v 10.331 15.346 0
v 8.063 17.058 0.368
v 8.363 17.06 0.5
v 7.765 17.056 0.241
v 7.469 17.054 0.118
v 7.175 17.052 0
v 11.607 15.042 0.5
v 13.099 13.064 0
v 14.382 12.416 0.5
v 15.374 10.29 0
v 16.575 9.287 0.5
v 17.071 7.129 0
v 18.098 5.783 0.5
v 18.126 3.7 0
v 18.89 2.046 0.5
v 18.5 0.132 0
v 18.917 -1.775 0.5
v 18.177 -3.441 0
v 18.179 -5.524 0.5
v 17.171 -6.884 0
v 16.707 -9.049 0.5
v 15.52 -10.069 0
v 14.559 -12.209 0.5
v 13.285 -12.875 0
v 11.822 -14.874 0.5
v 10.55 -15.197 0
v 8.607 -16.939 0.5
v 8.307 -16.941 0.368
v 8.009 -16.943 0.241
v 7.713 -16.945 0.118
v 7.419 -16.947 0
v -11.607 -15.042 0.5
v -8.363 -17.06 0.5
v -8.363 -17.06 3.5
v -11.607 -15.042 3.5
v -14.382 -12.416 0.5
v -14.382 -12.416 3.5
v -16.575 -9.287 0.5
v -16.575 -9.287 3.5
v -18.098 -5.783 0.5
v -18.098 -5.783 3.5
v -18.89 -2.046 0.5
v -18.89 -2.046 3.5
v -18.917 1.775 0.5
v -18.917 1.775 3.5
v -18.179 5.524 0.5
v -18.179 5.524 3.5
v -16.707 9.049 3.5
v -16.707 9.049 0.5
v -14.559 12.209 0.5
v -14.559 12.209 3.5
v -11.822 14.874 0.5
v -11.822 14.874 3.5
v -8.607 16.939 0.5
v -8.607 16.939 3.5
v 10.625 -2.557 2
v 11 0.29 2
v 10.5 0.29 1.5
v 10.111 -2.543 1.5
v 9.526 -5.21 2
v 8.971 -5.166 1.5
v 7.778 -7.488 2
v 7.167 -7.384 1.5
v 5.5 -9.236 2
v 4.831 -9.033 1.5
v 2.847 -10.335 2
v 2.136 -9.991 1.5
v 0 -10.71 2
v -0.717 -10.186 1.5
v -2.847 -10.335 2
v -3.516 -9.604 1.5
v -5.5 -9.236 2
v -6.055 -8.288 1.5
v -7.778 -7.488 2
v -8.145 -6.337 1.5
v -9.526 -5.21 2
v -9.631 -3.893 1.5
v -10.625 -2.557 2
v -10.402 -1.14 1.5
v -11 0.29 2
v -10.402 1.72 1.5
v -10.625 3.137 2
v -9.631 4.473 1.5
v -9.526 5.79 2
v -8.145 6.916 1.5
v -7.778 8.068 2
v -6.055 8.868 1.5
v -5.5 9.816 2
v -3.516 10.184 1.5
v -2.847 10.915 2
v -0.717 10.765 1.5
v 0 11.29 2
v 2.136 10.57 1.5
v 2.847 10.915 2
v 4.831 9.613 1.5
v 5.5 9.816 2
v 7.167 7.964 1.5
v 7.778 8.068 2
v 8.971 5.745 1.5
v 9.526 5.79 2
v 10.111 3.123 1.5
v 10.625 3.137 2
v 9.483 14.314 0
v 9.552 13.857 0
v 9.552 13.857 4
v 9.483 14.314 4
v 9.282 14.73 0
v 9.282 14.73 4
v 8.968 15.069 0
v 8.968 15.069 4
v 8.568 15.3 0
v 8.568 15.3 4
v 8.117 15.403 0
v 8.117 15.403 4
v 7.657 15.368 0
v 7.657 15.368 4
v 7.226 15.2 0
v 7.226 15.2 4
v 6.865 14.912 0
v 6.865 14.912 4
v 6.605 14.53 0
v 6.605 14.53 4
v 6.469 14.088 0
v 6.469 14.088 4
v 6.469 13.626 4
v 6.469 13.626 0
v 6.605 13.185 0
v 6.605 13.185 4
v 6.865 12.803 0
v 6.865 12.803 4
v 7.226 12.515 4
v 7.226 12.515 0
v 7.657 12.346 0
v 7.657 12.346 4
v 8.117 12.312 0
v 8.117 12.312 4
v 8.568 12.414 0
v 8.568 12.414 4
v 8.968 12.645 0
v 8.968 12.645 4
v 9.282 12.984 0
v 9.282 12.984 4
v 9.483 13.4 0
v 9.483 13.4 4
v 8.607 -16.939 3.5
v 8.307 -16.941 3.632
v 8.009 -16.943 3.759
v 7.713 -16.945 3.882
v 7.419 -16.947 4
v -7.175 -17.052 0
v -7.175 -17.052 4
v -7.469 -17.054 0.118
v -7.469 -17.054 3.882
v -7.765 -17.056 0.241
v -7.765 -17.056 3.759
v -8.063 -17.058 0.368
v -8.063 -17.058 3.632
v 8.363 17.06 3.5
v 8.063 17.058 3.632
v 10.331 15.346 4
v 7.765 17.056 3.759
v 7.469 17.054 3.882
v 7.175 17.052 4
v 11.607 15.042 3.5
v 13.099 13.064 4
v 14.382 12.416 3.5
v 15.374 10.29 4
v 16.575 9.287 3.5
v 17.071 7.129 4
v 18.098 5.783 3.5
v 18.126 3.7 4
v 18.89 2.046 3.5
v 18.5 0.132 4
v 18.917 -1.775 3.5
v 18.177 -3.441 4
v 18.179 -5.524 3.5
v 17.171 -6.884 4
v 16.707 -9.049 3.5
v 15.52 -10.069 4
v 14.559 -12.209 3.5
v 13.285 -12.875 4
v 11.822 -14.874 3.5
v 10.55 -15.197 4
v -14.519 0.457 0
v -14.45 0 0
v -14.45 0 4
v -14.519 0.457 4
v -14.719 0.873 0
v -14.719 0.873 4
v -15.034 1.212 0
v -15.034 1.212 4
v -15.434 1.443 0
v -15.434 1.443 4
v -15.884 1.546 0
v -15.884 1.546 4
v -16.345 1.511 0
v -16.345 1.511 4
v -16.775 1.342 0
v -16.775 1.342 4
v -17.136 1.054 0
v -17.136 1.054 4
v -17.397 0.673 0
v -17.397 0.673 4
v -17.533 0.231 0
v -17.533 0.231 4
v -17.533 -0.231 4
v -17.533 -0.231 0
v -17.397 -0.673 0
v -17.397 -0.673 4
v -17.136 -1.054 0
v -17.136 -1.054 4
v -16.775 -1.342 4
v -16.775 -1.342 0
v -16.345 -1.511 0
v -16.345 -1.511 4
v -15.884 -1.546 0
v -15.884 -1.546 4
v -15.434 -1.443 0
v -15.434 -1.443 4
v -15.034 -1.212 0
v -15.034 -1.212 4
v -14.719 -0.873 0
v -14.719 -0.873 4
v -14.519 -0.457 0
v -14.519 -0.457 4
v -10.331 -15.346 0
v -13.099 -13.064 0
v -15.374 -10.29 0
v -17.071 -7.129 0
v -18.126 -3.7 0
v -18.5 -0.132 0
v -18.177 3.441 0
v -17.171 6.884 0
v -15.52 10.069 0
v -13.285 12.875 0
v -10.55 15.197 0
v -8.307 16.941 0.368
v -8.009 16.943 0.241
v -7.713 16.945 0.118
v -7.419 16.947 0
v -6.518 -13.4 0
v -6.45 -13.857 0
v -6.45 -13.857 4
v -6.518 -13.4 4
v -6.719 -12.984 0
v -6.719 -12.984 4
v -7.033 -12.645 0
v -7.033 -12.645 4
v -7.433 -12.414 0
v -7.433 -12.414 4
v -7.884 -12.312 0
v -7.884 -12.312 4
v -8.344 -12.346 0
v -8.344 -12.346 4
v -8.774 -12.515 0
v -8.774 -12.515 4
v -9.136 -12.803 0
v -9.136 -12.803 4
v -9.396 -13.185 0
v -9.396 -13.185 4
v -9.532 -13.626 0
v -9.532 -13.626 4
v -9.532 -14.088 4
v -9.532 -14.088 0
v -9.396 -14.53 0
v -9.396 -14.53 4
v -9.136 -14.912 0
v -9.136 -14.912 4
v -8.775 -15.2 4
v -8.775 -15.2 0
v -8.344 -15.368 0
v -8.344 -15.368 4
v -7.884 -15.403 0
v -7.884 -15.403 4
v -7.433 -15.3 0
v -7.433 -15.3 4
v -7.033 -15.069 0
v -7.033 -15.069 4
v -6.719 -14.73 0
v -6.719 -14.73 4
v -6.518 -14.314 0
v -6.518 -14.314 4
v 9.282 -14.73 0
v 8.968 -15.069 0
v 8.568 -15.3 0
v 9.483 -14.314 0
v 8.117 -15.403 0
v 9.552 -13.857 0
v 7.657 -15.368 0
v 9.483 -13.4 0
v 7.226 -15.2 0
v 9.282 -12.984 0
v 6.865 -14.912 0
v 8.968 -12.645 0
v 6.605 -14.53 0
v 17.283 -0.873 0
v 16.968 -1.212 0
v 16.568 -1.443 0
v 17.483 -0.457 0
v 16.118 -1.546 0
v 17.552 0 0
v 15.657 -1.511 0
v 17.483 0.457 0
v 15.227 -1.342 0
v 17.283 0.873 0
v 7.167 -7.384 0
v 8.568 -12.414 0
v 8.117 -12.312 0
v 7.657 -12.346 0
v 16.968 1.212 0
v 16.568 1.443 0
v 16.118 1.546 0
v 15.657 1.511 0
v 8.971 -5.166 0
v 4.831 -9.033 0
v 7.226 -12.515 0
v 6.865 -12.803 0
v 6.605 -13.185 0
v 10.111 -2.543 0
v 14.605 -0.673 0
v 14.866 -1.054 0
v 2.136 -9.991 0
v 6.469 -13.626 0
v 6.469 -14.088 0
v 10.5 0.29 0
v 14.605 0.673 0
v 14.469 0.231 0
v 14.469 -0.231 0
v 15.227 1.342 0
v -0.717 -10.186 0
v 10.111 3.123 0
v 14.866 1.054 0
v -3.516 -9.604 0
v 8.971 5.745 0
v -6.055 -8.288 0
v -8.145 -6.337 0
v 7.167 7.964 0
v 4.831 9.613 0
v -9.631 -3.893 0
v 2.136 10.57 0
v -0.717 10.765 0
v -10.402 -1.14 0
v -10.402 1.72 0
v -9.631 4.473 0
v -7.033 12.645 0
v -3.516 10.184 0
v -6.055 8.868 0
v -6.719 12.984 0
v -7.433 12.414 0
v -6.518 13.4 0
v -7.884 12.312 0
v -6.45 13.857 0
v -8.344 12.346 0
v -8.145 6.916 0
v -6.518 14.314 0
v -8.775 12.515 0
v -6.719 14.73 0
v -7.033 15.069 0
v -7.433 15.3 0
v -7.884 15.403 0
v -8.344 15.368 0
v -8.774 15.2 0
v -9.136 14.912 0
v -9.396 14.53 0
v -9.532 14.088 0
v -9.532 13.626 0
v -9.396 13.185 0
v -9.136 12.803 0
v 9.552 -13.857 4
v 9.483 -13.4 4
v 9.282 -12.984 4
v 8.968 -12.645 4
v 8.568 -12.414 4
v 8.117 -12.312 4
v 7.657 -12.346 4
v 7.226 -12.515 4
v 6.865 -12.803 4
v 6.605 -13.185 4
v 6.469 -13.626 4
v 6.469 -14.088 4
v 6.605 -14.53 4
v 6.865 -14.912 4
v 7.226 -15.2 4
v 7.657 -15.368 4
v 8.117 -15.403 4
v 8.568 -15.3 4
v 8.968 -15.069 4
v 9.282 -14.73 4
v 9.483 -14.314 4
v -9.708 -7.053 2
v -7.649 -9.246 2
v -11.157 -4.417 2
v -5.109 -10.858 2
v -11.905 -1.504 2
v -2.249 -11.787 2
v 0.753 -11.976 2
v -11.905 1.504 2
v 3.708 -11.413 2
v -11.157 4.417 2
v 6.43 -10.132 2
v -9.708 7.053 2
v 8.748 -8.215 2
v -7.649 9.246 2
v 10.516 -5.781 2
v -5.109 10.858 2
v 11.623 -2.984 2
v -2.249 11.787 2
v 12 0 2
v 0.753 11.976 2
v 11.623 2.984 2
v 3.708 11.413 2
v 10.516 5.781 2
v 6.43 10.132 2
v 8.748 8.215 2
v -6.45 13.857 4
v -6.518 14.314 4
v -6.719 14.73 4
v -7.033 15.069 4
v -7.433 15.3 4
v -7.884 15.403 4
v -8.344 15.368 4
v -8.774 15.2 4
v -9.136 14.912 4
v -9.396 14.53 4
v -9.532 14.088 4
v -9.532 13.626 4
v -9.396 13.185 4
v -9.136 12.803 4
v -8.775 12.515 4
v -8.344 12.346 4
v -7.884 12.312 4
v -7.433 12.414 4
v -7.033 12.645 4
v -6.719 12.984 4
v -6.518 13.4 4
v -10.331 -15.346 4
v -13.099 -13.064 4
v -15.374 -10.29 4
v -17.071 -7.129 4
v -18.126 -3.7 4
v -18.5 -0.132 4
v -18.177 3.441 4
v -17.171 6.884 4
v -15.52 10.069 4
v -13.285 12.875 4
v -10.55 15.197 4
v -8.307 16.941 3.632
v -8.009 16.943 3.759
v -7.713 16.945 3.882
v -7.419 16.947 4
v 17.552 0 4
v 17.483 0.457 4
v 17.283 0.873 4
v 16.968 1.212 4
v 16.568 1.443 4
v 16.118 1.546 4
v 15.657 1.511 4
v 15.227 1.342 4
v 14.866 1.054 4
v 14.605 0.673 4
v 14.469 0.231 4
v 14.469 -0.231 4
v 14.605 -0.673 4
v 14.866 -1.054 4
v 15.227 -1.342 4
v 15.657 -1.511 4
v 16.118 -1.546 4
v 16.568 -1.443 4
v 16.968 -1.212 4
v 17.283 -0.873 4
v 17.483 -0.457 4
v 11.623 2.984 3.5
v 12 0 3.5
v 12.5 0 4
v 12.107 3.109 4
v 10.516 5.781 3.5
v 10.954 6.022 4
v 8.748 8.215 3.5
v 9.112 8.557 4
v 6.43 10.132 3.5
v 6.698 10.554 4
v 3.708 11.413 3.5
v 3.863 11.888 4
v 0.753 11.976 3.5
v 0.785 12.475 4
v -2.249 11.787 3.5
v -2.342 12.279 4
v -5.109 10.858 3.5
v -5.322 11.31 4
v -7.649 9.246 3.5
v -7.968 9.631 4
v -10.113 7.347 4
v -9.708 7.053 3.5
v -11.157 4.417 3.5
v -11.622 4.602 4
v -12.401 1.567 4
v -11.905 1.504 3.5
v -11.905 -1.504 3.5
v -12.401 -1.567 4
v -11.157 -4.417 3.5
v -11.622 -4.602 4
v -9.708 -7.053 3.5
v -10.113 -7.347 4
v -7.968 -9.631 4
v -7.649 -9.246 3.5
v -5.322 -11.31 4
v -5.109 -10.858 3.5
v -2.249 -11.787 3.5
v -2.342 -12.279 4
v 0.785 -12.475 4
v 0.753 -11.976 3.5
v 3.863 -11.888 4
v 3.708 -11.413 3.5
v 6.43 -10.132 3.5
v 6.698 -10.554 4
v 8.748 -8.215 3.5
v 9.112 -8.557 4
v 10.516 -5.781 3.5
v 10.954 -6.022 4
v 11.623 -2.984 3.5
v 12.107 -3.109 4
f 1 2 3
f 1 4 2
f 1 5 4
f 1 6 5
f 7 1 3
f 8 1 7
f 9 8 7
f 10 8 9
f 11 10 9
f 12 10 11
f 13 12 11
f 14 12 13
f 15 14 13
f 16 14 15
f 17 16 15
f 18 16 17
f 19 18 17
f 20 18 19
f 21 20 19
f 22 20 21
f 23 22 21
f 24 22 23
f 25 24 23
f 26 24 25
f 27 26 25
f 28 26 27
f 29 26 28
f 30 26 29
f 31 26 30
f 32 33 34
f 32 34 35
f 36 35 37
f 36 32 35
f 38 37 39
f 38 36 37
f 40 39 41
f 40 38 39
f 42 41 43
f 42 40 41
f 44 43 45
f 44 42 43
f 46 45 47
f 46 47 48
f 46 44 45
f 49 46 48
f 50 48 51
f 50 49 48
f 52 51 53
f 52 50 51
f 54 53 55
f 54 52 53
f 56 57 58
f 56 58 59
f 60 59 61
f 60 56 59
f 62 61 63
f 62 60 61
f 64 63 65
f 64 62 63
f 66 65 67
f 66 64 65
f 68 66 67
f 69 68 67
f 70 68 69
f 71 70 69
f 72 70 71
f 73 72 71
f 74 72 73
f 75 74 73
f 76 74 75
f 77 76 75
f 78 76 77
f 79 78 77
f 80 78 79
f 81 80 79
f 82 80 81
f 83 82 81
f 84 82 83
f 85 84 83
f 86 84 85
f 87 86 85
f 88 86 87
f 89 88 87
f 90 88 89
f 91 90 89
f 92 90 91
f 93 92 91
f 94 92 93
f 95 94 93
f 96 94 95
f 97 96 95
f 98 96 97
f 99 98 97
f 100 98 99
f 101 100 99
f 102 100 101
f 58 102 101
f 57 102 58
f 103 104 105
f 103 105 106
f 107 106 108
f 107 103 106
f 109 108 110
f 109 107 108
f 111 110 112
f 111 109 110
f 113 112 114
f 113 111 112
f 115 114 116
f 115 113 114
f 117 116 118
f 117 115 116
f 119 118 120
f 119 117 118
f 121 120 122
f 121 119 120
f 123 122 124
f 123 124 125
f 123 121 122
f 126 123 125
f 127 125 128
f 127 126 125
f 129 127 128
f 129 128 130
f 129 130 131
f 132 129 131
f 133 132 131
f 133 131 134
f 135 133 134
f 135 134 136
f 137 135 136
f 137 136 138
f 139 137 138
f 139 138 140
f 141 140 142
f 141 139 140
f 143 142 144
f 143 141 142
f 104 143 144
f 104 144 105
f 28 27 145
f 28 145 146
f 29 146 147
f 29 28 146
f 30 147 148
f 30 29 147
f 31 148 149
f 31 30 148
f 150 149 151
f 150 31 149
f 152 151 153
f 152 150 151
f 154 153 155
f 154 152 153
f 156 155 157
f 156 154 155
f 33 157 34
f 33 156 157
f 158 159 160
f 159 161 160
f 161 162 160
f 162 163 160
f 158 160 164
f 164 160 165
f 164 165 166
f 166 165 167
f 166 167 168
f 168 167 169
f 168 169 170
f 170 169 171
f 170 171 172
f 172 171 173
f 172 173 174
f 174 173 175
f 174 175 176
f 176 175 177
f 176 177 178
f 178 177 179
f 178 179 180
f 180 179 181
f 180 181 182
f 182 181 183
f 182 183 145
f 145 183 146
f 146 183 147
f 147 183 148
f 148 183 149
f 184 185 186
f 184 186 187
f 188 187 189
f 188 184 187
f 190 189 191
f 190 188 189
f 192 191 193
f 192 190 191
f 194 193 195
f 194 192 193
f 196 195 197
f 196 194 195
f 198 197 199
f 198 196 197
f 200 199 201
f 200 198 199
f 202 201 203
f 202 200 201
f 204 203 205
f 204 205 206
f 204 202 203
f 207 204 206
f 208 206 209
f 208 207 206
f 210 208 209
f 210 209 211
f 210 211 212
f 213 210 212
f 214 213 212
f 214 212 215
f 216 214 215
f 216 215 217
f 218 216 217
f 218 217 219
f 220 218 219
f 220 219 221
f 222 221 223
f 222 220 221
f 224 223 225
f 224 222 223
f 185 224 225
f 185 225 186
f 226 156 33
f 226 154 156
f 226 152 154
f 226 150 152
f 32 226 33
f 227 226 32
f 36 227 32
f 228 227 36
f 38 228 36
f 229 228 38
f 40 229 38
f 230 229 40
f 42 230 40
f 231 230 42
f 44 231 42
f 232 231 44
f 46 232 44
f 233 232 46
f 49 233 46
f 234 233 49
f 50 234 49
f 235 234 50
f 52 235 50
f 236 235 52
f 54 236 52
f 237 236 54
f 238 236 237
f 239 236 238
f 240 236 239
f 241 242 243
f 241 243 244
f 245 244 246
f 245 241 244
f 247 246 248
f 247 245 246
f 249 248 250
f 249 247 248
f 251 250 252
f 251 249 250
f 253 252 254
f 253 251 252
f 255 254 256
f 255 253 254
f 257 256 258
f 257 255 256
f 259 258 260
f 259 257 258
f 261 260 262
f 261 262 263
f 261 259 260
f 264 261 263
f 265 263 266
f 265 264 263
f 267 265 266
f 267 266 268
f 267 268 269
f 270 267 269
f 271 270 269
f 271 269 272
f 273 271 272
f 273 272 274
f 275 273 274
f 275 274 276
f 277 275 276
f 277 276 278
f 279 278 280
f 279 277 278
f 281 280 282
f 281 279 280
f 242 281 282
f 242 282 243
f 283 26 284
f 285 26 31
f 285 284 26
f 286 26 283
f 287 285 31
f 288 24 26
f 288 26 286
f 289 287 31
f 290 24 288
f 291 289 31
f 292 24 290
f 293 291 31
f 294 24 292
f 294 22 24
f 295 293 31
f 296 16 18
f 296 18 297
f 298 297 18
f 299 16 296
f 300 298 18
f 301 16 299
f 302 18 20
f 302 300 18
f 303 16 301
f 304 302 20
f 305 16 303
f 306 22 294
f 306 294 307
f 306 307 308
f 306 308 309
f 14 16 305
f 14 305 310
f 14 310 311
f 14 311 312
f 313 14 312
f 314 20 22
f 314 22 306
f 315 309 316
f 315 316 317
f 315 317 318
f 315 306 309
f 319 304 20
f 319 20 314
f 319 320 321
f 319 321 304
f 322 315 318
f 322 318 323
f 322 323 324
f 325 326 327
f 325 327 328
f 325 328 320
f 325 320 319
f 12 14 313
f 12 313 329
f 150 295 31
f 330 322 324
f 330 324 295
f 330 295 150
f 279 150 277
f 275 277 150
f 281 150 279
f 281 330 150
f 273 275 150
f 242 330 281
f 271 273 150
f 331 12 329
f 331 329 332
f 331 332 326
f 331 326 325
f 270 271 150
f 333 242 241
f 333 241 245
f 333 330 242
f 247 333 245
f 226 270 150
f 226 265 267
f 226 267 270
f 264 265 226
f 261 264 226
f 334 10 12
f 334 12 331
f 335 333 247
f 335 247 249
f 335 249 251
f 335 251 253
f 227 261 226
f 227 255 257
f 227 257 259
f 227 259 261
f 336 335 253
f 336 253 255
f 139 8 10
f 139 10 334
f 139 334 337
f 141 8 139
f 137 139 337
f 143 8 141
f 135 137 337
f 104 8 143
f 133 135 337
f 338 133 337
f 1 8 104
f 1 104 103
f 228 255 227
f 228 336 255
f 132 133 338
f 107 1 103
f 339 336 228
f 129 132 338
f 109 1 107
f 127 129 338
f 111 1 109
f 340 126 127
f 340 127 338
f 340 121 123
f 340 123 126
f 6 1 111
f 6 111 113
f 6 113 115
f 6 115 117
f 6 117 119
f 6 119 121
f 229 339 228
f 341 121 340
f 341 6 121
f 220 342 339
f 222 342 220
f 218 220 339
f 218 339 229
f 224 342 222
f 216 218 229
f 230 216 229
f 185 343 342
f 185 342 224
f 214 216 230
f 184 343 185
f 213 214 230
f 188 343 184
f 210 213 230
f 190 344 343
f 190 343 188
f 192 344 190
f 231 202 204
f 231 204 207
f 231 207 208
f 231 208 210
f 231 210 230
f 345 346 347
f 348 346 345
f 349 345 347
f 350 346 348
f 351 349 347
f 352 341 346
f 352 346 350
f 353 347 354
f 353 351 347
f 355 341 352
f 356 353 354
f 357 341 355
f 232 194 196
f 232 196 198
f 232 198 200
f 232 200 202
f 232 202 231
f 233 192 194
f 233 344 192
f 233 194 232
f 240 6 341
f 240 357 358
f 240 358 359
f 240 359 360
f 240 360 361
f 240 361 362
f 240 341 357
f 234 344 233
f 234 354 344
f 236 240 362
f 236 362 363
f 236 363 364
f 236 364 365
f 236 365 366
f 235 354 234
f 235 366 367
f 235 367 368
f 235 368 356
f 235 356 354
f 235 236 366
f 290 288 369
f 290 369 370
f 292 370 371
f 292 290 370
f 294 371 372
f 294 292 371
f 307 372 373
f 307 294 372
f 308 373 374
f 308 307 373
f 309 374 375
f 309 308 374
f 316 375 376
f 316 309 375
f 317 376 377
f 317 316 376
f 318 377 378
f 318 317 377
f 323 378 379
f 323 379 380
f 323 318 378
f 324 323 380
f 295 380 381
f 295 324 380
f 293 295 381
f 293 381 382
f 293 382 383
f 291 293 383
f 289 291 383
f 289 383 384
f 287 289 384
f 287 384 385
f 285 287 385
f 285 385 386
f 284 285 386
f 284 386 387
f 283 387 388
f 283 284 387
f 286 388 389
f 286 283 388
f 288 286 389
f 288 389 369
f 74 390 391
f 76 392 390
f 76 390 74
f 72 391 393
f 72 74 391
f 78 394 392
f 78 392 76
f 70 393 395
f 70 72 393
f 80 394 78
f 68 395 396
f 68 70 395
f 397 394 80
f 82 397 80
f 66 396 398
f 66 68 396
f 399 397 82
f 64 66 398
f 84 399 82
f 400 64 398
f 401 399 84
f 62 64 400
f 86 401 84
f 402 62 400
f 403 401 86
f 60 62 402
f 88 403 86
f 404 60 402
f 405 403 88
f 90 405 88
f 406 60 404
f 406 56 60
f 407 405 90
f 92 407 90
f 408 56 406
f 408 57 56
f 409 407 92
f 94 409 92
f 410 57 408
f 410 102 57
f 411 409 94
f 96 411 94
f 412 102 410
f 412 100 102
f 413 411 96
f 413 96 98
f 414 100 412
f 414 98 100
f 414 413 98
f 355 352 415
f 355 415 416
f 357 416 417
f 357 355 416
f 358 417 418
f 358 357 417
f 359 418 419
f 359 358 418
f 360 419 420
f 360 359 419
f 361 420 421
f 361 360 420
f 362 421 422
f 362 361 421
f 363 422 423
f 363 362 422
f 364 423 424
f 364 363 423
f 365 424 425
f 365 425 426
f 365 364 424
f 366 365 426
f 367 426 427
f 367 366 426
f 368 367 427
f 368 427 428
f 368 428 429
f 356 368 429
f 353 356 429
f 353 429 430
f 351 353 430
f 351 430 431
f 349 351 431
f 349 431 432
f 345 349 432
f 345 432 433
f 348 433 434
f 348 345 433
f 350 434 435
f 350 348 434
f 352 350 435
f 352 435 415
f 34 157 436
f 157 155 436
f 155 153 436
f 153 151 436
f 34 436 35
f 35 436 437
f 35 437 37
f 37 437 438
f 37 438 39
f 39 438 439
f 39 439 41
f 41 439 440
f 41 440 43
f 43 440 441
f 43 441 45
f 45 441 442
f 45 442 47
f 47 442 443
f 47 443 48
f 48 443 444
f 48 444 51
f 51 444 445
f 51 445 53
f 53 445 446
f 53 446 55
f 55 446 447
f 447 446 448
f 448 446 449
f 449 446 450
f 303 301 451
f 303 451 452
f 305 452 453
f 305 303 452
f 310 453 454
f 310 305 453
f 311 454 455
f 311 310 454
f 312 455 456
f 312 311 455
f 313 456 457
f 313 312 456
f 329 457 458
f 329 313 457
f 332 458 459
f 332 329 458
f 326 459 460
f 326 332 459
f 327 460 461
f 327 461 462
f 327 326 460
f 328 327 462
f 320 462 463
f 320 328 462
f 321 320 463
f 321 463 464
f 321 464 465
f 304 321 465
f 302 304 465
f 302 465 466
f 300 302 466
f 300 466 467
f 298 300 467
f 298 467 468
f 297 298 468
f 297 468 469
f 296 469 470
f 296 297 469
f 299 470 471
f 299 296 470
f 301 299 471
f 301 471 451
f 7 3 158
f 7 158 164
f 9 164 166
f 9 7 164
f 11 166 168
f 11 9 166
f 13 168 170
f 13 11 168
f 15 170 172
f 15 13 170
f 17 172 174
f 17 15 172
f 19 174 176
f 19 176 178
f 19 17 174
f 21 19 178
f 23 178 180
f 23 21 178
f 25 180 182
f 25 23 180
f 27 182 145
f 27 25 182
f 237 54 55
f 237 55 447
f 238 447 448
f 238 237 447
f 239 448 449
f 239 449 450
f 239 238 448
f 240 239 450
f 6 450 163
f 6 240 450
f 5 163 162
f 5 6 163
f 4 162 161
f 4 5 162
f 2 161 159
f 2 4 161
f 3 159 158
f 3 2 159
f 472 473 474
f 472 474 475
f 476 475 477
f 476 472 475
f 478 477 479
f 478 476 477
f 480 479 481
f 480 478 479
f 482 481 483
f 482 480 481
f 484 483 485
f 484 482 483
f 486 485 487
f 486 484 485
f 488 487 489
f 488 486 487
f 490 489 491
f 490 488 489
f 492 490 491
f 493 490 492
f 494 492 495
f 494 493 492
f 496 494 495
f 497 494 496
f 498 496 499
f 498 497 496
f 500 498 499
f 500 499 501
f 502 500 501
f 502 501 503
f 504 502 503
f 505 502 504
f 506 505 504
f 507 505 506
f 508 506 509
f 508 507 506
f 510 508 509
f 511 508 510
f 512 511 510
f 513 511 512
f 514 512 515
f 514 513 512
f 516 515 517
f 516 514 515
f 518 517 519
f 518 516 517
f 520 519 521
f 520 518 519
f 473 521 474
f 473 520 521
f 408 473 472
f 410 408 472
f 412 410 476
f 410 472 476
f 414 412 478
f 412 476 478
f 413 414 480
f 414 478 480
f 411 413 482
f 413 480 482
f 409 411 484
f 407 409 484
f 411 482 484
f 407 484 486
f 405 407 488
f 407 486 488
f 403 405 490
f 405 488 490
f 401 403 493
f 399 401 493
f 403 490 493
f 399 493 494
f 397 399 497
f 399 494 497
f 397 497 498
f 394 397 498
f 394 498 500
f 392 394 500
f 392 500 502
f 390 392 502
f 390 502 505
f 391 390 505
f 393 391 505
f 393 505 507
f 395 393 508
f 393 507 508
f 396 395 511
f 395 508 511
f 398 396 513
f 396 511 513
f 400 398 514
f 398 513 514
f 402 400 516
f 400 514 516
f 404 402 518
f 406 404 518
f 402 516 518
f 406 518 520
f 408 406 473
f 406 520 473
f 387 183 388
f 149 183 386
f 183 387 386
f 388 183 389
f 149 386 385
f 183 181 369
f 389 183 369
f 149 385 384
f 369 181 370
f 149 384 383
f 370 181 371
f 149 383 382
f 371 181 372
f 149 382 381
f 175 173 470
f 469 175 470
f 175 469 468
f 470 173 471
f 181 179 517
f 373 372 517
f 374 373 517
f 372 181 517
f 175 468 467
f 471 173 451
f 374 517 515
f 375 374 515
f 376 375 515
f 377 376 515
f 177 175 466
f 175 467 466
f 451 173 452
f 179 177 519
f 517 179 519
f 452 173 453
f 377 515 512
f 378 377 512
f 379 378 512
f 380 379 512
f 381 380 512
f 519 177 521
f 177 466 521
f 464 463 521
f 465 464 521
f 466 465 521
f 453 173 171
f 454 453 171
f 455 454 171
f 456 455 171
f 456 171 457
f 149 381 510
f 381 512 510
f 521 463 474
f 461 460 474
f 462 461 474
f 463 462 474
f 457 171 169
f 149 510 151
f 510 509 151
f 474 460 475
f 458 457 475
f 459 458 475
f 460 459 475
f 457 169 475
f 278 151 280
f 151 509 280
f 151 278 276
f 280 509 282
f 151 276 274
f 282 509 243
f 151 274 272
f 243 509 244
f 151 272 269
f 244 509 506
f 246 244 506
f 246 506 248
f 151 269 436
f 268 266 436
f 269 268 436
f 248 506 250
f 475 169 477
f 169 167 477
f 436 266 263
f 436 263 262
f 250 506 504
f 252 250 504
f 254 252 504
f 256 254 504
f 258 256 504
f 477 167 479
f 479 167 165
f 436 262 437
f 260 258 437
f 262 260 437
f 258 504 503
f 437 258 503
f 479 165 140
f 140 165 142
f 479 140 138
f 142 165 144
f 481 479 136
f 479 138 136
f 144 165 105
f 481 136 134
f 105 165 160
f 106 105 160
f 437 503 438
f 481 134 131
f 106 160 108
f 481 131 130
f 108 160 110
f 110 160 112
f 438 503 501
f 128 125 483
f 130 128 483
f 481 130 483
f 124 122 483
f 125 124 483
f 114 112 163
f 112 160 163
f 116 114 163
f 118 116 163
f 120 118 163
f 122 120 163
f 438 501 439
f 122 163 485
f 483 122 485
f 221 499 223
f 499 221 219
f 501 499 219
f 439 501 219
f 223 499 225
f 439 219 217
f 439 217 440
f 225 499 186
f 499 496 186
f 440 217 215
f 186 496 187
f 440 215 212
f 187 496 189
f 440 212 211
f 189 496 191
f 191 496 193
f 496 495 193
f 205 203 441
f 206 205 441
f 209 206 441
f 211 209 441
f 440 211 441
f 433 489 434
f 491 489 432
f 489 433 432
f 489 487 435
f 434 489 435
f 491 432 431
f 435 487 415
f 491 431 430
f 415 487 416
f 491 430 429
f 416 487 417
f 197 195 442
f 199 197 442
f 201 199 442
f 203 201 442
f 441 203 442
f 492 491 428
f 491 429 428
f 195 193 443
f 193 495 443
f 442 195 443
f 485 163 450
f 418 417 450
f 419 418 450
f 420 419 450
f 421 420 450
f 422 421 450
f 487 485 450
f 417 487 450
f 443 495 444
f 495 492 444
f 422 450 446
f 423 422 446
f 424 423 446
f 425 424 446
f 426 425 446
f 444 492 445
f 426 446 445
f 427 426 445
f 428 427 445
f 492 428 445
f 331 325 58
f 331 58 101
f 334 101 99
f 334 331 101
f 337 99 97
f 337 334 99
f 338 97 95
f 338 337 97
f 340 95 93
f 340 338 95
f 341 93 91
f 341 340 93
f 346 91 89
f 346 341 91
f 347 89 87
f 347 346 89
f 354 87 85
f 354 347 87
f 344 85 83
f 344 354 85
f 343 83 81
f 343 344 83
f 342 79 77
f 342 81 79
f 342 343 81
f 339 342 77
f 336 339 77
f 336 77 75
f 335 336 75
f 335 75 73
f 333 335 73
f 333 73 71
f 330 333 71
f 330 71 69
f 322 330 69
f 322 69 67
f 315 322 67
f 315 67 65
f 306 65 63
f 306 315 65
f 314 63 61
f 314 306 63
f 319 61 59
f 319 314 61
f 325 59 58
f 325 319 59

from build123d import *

# Parameters (mm, degrees)
SKETCH2_R           = 10.5
SKETCH2_R_2         = 1.55
BOSS_EXTRUDE1_DEPTH = 4
SKETCH3_R           = 12
CUT_EXTRUDE1_DEPTH  = 2
CHAMFER1_SIZE       = 0.5


with BuildPart() as part:
    # Sketch2 → Boss-Extrude1 (new body)
    with BuildSketch(Plane.XY):
        with BuildLine():
            Line((-8.606779144, 16.938812023), (8.36334863, 17.060316518))
            ThreePointArc((8.36334863, 17.060316518), (18.999513009, 0.136034699), (8.606779144, -16.938812023))
            Line((8.606779144, -16.938812023), (-8.36334863, -17.060316518))
            ThreePointArc((-8.36334863, -17.060316518), (-18.999513009, -0.136034699), (-8.606779144, 16.938812023))
        make_face()
        with Locations((0, 0.289780582)):
            Circle(SKETCH2_R, mode=Mode.SUBTRACT)
        with Locations((-16, 0)):
            Circle(SKETCH2_R_2, mode=Mode.SUBTRACT)
        with Locations((-7.9995, 13.857272486)):
            Circle(SKETCH2_R_2, mode=Mode.SUBTRACT)
        with Locations((8.0015, 13.857272486)):
            Circle(SKETCH2_R_2, mode=Mode.SUBTRACT)
        with Locations((16.002, 0)):
            Circle(SKETCH2_R_2, mode=Mode.SUBTRACT)
        with Locations((8.0015, -13.857272486)):
            Circle(SKETCH2_R_2, mode=Mode.SUBTRACT)
        with Locations((-7.9995, -13.857272486)):
            Circle(SKETCH2_R_2, mode=Mode.SUBTRACT)
    extrude(amount=BOSS_EXTRUDE1_DEPTH)

    # Sketch3 → Cut-Extrude1 (cut)
    with BuildSketch(Plane.XY.offset(4)):
        Circle(SKETCH3_R)
    extrude(amount=-CUT_EXTRUDE1_DEPTH, mode=Mode.SUBTRACT)

    # Chamfer1
    chamfer1_edges = [part.edges().sort_by_distance(p)[0] for p in [
        (18.999513009, 0.136034699, 4),
        (-10.5, 0.289780582, 2),
        (-12, 0, 4),
        (-18.999513009, -0.136034699, 4),
        (18.999513009, 0.136034699, 0),
        (-18.999513009, -0.136034699, 0),
    ]]
    chamfer(chamfer1_edges, length=CHAMFER1_SIZE)


solid = part.part
